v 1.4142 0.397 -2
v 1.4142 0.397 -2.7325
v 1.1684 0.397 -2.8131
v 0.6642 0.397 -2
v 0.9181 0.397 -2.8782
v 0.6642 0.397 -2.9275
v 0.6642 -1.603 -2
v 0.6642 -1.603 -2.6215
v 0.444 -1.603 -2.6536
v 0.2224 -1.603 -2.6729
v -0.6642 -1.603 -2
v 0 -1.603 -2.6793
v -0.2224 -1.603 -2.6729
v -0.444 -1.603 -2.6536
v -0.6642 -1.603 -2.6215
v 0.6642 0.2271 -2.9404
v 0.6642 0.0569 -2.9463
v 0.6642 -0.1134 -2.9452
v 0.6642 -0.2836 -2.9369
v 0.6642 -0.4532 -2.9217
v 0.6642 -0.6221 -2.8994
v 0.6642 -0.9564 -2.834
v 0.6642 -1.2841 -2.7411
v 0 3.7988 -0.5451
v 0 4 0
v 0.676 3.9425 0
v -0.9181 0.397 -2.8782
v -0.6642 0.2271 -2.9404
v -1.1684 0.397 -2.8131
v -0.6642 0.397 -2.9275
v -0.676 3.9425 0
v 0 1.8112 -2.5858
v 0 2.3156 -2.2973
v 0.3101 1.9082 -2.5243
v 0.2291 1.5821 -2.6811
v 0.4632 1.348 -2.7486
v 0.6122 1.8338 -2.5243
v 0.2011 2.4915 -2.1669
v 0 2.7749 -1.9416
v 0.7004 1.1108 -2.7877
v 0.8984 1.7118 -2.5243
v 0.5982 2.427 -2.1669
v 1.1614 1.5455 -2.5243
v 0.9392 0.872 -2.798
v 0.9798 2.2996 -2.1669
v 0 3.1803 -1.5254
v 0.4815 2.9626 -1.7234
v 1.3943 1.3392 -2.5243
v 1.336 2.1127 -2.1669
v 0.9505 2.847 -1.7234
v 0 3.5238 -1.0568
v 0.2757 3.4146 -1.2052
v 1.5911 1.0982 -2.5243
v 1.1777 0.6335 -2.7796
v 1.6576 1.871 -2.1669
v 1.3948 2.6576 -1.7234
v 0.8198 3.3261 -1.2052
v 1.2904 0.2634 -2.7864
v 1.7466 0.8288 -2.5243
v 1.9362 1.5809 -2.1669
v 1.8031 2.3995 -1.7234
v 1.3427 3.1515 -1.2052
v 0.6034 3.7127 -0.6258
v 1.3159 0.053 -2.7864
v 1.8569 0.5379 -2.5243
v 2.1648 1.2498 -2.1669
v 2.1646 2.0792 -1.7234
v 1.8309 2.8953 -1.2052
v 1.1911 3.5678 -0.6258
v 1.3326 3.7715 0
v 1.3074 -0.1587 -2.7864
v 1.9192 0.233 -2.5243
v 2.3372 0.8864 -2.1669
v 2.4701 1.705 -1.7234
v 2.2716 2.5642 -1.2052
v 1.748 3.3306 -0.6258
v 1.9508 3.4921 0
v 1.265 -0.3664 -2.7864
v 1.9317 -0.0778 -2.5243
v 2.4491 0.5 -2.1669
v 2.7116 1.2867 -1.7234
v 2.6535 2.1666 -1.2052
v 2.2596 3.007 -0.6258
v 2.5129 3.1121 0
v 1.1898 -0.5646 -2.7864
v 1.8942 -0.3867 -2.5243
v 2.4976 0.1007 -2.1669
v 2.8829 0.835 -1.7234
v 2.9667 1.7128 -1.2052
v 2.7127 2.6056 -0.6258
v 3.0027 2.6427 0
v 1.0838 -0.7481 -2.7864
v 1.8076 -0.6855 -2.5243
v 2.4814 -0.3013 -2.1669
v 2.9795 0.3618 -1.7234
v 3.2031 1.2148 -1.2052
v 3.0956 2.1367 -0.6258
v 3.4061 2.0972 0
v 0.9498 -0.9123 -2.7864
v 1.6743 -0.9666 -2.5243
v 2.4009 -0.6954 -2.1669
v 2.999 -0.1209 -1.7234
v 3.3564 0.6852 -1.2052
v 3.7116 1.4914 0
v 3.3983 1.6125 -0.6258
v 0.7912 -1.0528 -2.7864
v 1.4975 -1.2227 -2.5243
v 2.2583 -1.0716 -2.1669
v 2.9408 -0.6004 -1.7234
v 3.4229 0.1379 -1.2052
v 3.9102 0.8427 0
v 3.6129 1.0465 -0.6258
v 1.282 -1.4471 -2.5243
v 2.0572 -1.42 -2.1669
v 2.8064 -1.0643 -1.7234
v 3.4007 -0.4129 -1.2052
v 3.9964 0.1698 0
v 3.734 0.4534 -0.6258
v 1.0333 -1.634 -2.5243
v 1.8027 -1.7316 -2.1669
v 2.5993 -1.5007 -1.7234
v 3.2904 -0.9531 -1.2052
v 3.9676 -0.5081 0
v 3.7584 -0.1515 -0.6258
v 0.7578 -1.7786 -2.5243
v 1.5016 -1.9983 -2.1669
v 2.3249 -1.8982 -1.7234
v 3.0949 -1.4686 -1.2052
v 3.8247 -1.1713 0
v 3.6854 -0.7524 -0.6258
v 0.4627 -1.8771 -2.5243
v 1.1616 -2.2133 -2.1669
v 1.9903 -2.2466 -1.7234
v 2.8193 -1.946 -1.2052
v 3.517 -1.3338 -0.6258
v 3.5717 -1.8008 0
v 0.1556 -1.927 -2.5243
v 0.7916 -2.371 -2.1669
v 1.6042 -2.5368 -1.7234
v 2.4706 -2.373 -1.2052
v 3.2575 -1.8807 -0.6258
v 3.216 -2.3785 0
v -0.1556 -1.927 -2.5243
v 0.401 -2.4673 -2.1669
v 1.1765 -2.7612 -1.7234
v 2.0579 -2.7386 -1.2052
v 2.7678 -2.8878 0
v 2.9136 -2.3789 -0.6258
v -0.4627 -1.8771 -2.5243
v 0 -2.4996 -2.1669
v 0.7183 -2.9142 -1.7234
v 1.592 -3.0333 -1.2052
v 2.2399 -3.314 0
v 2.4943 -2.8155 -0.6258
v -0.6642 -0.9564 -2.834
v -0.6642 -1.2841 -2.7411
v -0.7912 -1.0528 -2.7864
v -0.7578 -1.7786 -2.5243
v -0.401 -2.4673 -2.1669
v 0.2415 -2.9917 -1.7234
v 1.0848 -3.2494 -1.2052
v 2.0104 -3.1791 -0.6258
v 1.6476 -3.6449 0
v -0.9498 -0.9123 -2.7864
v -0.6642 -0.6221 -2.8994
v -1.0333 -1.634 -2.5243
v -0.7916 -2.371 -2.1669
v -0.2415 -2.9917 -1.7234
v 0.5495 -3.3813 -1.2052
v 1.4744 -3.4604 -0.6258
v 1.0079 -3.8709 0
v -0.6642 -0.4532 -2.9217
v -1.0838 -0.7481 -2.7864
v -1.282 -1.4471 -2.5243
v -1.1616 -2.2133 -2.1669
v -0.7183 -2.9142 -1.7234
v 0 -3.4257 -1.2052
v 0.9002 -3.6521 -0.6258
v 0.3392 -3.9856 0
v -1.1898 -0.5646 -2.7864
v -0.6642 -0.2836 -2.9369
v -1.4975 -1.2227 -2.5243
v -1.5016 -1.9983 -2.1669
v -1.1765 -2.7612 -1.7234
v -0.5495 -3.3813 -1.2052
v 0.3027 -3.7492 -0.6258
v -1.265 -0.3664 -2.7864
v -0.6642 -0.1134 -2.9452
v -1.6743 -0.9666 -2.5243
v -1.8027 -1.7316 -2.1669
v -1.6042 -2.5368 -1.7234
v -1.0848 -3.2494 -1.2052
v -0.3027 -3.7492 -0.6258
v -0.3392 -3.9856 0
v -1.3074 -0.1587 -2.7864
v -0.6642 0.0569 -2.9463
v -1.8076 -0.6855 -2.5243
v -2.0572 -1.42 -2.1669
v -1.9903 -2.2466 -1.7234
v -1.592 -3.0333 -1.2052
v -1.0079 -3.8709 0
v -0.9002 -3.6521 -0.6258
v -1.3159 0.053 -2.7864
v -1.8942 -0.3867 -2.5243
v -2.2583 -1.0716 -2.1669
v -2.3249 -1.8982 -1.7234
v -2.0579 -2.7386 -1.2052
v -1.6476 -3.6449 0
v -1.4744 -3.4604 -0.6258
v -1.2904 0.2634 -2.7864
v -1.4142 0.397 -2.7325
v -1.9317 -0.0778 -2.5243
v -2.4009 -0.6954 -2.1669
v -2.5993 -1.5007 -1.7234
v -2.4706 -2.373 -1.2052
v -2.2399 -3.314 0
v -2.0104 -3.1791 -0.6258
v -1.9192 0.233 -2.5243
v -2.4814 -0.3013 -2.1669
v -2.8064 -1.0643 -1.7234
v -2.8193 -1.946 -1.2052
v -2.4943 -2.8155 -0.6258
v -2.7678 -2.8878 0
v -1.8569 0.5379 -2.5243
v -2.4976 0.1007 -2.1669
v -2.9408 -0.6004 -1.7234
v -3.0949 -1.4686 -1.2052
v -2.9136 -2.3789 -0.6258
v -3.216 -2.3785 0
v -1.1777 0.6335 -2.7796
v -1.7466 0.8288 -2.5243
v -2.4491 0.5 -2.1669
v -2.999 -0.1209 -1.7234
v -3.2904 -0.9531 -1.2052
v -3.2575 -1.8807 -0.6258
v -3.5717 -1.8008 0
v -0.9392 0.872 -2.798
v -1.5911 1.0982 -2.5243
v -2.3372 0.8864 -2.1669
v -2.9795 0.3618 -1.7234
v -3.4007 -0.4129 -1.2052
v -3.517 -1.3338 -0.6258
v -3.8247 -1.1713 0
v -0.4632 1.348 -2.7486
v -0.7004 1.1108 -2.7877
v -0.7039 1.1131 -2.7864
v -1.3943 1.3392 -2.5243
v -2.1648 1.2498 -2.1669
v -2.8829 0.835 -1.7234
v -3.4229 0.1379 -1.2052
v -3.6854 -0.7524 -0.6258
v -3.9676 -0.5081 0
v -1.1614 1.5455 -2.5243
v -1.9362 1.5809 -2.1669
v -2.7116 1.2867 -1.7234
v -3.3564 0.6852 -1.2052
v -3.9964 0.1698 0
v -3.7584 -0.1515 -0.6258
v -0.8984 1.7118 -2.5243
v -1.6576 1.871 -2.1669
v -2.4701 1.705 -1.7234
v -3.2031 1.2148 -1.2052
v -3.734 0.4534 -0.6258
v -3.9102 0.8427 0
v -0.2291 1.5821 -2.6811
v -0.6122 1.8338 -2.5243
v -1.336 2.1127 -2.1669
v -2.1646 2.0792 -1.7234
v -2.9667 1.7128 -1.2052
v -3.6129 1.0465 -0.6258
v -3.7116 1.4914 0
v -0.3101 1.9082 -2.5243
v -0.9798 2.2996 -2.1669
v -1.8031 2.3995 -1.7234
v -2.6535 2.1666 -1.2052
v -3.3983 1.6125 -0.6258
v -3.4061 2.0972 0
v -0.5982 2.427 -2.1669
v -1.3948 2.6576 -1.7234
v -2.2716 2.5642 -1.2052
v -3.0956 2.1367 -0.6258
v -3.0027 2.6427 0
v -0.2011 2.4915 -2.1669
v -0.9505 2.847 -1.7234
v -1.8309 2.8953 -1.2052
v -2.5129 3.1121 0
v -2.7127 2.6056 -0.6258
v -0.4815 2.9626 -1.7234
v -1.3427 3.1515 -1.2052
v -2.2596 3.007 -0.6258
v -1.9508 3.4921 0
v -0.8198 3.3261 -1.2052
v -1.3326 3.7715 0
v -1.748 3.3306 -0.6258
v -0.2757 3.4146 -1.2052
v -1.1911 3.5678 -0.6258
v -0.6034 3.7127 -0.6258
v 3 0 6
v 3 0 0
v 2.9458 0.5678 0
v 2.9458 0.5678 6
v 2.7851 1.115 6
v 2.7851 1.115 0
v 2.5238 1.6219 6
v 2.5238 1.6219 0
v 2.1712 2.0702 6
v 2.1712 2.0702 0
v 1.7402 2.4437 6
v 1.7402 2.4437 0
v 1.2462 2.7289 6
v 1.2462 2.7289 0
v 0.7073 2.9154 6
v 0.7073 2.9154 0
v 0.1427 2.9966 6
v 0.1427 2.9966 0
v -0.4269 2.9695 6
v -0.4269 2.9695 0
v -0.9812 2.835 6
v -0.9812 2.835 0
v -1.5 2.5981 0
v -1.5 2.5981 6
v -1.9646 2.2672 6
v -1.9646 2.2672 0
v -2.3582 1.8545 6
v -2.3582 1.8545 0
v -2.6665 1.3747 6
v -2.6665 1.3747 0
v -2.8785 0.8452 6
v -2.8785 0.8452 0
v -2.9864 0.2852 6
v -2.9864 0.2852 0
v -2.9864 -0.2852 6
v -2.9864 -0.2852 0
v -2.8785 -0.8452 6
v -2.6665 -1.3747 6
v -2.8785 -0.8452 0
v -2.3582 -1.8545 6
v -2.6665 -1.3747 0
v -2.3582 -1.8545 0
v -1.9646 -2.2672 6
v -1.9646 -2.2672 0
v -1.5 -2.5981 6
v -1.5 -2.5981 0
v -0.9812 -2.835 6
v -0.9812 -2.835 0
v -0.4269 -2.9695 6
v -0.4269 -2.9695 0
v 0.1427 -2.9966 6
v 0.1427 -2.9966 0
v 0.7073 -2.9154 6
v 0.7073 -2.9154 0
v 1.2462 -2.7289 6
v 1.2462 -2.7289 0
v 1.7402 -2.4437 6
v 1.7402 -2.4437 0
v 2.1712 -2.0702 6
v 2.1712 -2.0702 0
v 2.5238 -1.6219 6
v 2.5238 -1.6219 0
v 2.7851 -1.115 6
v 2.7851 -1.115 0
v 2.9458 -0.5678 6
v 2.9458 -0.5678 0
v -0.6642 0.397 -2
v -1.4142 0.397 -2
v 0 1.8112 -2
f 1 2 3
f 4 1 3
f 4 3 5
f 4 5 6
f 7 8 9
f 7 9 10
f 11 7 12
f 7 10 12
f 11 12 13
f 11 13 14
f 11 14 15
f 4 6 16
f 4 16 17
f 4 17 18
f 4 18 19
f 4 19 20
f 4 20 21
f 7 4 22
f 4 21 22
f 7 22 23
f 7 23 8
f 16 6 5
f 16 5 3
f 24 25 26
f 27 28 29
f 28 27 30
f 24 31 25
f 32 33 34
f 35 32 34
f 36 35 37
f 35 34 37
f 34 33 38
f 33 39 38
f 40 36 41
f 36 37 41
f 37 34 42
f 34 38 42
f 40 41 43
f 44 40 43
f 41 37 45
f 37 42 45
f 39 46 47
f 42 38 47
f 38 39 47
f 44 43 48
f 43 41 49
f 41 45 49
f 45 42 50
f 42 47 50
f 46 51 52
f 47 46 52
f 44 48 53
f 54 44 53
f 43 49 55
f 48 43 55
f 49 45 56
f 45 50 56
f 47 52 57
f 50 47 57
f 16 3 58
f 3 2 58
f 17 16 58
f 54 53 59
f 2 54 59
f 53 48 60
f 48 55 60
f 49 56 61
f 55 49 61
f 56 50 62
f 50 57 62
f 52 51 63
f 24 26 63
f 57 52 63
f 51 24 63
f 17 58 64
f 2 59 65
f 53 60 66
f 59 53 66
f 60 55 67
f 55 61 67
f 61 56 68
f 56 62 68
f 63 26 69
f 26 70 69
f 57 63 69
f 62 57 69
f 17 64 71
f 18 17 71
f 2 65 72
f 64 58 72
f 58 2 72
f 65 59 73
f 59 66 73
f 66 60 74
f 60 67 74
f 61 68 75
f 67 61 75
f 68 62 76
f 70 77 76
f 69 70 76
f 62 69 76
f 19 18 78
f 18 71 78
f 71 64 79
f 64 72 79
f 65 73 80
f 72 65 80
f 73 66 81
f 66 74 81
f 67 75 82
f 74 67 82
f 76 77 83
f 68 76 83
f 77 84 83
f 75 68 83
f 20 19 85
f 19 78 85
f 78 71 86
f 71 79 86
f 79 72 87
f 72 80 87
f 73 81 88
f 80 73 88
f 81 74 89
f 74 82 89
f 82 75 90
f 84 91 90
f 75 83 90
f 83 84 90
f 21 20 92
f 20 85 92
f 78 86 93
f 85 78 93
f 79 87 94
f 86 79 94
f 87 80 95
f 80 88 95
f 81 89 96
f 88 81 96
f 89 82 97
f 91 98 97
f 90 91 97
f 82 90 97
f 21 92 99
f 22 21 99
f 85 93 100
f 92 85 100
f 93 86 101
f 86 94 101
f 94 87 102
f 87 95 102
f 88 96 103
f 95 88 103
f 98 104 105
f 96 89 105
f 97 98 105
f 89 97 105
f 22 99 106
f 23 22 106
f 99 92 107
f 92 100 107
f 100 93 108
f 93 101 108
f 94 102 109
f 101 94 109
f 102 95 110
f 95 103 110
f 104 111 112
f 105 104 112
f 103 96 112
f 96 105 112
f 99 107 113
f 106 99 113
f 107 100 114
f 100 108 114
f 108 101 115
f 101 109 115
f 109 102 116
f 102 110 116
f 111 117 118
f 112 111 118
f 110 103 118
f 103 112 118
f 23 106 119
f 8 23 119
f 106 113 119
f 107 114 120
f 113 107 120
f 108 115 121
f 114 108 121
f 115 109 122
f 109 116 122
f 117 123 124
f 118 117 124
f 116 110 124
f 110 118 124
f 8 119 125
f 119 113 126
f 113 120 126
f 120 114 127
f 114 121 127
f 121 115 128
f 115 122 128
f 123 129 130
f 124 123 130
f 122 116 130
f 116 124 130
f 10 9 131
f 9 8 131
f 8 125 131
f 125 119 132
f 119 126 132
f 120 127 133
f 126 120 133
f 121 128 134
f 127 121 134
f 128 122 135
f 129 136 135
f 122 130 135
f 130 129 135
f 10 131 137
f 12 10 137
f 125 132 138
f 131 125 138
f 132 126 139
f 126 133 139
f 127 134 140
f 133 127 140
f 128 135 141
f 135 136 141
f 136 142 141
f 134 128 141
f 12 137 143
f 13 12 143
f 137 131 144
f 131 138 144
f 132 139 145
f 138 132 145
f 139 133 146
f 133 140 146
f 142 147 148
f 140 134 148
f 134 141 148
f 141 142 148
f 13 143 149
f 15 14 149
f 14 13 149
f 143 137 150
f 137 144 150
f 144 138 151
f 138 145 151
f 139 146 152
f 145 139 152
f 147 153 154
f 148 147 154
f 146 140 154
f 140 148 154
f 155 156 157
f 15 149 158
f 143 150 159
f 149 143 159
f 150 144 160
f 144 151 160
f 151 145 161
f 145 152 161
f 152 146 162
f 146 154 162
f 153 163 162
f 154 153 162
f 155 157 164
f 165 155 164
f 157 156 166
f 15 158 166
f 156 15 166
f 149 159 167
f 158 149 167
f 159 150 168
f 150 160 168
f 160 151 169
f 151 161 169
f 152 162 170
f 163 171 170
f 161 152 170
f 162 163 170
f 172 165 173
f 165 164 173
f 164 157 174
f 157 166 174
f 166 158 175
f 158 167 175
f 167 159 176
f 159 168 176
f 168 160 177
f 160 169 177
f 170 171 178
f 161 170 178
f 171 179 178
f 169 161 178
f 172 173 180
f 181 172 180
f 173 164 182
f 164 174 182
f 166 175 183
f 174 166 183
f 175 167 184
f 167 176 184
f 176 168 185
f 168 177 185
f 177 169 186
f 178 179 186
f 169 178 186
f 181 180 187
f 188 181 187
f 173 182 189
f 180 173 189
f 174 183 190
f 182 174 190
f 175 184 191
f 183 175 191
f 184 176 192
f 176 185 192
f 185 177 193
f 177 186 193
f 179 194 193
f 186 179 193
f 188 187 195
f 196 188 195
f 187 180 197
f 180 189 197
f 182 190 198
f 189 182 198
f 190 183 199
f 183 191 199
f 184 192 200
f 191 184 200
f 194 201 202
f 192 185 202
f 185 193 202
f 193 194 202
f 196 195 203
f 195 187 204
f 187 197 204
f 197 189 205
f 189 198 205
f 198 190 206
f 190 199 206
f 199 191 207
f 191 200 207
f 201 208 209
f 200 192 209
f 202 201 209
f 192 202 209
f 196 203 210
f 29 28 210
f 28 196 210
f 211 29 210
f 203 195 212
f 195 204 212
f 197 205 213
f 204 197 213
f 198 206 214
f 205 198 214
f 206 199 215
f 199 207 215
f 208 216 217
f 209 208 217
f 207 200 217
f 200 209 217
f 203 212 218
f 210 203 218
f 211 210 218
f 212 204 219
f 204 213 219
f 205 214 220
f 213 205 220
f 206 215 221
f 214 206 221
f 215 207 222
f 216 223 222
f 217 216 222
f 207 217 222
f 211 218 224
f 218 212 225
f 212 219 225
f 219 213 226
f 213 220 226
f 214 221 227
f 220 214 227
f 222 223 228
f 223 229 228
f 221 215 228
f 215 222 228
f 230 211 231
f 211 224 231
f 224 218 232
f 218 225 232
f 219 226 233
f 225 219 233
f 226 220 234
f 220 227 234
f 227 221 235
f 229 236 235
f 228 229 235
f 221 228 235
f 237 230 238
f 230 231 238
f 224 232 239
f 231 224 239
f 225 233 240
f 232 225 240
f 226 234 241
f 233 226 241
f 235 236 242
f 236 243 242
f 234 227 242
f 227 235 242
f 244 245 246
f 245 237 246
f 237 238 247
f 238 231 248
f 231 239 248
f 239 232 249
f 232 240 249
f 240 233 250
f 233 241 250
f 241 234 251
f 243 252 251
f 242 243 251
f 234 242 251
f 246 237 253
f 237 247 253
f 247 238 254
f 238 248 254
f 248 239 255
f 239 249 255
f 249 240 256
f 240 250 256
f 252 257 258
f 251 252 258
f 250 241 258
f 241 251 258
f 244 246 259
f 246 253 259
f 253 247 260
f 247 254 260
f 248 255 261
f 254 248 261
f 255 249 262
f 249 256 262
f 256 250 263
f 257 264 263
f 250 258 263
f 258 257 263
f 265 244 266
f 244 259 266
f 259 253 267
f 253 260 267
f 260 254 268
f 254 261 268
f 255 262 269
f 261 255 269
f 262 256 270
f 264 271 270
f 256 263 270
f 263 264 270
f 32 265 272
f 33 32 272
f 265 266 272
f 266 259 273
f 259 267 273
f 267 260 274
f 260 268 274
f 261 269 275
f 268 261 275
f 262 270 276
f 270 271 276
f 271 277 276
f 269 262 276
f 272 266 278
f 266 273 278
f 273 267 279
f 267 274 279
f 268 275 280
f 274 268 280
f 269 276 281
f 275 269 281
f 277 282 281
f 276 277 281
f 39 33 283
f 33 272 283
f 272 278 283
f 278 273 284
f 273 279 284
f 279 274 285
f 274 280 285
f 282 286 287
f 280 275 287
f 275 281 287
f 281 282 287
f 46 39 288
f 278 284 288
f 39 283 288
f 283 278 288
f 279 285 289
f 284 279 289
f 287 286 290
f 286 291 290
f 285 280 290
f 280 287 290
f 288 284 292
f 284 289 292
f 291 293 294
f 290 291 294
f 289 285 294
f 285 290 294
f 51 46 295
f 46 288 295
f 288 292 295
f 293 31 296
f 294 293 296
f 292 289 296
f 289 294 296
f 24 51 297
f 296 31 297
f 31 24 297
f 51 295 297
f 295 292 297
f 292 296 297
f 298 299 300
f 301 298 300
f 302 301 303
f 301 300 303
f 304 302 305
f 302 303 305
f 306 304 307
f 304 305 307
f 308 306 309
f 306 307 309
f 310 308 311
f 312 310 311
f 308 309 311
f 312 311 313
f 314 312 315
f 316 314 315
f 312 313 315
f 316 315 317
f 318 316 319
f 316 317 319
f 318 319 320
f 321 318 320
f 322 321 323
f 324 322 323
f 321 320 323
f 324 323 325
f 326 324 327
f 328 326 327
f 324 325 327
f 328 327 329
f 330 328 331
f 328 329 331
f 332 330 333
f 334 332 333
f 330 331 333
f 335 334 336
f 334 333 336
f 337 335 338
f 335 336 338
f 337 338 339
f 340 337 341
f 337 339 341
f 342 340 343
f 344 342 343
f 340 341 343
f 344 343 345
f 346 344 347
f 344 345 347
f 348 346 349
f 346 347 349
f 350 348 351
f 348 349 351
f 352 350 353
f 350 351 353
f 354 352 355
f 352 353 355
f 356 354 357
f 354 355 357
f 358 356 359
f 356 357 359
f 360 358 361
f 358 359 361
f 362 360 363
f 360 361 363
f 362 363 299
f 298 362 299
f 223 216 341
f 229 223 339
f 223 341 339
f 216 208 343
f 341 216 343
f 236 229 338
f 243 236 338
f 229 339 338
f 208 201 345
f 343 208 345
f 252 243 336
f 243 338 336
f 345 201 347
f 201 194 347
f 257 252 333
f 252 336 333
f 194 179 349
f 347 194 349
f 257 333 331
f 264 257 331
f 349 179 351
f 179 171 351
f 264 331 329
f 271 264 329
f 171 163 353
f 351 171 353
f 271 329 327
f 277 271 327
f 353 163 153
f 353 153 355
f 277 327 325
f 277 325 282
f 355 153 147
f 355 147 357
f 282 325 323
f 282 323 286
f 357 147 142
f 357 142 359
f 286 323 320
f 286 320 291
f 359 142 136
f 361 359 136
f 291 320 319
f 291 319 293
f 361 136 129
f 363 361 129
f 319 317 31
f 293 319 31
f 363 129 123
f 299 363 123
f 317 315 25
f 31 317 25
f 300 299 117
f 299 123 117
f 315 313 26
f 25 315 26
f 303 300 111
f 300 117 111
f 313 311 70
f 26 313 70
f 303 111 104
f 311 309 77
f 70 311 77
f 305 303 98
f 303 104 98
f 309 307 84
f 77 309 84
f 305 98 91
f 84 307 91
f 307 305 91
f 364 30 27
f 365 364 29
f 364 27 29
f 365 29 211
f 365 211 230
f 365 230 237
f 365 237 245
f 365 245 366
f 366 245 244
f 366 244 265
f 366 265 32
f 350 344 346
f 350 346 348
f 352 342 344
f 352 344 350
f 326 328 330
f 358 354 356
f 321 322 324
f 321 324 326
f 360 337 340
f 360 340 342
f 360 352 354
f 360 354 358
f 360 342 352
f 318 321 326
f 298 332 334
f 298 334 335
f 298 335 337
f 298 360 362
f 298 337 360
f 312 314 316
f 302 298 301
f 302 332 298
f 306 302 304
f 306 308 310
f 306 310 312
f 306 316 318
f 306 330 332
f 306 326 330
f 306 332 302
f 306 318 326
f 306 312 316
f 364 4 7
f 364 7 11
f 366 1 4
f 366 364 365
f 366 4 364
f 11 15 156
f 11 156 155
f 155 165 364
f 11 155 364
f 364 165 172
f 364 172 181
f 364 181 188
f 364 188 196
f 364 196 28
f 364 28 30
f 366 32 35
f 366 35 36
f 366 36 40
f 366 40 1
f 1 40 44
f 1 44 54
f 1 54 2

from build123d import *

# Parameters (mm, degrees)
SKETCH1_R           = 3
BOSS_EXTRUDE1_DEPTH = 6
CUT_EXTRUDE1_DEPTH  = 1


with BuildPart() as part:
    # Sketch1 → Boss-Extrude1 (new body)
    with BuildSketch(Plane.XY):
        Circle(SKETCH1_R)
    extrude(amount=BOSS_EXTRUDE1_DEPTH)

    # Sketch4 → Revolve1 (revolve)
    with BuildSketch(Plane.ZY, mode=Mode.PRIVATE) as revolve1_sk:
        with BuildLine():
            Line((0, -4), (0, 0))
            Line((0, 0), (-3, 0))
            ThreePointArc((-3, 0), (-2.166666667, -2.5), (0, -4))
        make_face()
    revolve(revolve1_sk.sketch.rotate(Axis((0, 0, 0), (0, 0, -1)), 180), axis=Axis((0, 0, 0), (0, 0, -1)))

    # Sketch5 → Cut-Extrude1 (cut)
    with BuildSketch(Plane.XY.offset(-3)):
        Polygon((0, 1.811201152), (1.414213562, 0.396987589), (0.664213562, 0.396987589), (0.664213562, -1.603012411), (-0.664213562, -1.603012411), (-0.664213562, 0.396987589), (-1.414213562, 0.396987589), align=None)
    extrude(amount=CUT_EXTRUDE1_DEPTH, mode=Mode.SUBTRACT)


solid = part.part
